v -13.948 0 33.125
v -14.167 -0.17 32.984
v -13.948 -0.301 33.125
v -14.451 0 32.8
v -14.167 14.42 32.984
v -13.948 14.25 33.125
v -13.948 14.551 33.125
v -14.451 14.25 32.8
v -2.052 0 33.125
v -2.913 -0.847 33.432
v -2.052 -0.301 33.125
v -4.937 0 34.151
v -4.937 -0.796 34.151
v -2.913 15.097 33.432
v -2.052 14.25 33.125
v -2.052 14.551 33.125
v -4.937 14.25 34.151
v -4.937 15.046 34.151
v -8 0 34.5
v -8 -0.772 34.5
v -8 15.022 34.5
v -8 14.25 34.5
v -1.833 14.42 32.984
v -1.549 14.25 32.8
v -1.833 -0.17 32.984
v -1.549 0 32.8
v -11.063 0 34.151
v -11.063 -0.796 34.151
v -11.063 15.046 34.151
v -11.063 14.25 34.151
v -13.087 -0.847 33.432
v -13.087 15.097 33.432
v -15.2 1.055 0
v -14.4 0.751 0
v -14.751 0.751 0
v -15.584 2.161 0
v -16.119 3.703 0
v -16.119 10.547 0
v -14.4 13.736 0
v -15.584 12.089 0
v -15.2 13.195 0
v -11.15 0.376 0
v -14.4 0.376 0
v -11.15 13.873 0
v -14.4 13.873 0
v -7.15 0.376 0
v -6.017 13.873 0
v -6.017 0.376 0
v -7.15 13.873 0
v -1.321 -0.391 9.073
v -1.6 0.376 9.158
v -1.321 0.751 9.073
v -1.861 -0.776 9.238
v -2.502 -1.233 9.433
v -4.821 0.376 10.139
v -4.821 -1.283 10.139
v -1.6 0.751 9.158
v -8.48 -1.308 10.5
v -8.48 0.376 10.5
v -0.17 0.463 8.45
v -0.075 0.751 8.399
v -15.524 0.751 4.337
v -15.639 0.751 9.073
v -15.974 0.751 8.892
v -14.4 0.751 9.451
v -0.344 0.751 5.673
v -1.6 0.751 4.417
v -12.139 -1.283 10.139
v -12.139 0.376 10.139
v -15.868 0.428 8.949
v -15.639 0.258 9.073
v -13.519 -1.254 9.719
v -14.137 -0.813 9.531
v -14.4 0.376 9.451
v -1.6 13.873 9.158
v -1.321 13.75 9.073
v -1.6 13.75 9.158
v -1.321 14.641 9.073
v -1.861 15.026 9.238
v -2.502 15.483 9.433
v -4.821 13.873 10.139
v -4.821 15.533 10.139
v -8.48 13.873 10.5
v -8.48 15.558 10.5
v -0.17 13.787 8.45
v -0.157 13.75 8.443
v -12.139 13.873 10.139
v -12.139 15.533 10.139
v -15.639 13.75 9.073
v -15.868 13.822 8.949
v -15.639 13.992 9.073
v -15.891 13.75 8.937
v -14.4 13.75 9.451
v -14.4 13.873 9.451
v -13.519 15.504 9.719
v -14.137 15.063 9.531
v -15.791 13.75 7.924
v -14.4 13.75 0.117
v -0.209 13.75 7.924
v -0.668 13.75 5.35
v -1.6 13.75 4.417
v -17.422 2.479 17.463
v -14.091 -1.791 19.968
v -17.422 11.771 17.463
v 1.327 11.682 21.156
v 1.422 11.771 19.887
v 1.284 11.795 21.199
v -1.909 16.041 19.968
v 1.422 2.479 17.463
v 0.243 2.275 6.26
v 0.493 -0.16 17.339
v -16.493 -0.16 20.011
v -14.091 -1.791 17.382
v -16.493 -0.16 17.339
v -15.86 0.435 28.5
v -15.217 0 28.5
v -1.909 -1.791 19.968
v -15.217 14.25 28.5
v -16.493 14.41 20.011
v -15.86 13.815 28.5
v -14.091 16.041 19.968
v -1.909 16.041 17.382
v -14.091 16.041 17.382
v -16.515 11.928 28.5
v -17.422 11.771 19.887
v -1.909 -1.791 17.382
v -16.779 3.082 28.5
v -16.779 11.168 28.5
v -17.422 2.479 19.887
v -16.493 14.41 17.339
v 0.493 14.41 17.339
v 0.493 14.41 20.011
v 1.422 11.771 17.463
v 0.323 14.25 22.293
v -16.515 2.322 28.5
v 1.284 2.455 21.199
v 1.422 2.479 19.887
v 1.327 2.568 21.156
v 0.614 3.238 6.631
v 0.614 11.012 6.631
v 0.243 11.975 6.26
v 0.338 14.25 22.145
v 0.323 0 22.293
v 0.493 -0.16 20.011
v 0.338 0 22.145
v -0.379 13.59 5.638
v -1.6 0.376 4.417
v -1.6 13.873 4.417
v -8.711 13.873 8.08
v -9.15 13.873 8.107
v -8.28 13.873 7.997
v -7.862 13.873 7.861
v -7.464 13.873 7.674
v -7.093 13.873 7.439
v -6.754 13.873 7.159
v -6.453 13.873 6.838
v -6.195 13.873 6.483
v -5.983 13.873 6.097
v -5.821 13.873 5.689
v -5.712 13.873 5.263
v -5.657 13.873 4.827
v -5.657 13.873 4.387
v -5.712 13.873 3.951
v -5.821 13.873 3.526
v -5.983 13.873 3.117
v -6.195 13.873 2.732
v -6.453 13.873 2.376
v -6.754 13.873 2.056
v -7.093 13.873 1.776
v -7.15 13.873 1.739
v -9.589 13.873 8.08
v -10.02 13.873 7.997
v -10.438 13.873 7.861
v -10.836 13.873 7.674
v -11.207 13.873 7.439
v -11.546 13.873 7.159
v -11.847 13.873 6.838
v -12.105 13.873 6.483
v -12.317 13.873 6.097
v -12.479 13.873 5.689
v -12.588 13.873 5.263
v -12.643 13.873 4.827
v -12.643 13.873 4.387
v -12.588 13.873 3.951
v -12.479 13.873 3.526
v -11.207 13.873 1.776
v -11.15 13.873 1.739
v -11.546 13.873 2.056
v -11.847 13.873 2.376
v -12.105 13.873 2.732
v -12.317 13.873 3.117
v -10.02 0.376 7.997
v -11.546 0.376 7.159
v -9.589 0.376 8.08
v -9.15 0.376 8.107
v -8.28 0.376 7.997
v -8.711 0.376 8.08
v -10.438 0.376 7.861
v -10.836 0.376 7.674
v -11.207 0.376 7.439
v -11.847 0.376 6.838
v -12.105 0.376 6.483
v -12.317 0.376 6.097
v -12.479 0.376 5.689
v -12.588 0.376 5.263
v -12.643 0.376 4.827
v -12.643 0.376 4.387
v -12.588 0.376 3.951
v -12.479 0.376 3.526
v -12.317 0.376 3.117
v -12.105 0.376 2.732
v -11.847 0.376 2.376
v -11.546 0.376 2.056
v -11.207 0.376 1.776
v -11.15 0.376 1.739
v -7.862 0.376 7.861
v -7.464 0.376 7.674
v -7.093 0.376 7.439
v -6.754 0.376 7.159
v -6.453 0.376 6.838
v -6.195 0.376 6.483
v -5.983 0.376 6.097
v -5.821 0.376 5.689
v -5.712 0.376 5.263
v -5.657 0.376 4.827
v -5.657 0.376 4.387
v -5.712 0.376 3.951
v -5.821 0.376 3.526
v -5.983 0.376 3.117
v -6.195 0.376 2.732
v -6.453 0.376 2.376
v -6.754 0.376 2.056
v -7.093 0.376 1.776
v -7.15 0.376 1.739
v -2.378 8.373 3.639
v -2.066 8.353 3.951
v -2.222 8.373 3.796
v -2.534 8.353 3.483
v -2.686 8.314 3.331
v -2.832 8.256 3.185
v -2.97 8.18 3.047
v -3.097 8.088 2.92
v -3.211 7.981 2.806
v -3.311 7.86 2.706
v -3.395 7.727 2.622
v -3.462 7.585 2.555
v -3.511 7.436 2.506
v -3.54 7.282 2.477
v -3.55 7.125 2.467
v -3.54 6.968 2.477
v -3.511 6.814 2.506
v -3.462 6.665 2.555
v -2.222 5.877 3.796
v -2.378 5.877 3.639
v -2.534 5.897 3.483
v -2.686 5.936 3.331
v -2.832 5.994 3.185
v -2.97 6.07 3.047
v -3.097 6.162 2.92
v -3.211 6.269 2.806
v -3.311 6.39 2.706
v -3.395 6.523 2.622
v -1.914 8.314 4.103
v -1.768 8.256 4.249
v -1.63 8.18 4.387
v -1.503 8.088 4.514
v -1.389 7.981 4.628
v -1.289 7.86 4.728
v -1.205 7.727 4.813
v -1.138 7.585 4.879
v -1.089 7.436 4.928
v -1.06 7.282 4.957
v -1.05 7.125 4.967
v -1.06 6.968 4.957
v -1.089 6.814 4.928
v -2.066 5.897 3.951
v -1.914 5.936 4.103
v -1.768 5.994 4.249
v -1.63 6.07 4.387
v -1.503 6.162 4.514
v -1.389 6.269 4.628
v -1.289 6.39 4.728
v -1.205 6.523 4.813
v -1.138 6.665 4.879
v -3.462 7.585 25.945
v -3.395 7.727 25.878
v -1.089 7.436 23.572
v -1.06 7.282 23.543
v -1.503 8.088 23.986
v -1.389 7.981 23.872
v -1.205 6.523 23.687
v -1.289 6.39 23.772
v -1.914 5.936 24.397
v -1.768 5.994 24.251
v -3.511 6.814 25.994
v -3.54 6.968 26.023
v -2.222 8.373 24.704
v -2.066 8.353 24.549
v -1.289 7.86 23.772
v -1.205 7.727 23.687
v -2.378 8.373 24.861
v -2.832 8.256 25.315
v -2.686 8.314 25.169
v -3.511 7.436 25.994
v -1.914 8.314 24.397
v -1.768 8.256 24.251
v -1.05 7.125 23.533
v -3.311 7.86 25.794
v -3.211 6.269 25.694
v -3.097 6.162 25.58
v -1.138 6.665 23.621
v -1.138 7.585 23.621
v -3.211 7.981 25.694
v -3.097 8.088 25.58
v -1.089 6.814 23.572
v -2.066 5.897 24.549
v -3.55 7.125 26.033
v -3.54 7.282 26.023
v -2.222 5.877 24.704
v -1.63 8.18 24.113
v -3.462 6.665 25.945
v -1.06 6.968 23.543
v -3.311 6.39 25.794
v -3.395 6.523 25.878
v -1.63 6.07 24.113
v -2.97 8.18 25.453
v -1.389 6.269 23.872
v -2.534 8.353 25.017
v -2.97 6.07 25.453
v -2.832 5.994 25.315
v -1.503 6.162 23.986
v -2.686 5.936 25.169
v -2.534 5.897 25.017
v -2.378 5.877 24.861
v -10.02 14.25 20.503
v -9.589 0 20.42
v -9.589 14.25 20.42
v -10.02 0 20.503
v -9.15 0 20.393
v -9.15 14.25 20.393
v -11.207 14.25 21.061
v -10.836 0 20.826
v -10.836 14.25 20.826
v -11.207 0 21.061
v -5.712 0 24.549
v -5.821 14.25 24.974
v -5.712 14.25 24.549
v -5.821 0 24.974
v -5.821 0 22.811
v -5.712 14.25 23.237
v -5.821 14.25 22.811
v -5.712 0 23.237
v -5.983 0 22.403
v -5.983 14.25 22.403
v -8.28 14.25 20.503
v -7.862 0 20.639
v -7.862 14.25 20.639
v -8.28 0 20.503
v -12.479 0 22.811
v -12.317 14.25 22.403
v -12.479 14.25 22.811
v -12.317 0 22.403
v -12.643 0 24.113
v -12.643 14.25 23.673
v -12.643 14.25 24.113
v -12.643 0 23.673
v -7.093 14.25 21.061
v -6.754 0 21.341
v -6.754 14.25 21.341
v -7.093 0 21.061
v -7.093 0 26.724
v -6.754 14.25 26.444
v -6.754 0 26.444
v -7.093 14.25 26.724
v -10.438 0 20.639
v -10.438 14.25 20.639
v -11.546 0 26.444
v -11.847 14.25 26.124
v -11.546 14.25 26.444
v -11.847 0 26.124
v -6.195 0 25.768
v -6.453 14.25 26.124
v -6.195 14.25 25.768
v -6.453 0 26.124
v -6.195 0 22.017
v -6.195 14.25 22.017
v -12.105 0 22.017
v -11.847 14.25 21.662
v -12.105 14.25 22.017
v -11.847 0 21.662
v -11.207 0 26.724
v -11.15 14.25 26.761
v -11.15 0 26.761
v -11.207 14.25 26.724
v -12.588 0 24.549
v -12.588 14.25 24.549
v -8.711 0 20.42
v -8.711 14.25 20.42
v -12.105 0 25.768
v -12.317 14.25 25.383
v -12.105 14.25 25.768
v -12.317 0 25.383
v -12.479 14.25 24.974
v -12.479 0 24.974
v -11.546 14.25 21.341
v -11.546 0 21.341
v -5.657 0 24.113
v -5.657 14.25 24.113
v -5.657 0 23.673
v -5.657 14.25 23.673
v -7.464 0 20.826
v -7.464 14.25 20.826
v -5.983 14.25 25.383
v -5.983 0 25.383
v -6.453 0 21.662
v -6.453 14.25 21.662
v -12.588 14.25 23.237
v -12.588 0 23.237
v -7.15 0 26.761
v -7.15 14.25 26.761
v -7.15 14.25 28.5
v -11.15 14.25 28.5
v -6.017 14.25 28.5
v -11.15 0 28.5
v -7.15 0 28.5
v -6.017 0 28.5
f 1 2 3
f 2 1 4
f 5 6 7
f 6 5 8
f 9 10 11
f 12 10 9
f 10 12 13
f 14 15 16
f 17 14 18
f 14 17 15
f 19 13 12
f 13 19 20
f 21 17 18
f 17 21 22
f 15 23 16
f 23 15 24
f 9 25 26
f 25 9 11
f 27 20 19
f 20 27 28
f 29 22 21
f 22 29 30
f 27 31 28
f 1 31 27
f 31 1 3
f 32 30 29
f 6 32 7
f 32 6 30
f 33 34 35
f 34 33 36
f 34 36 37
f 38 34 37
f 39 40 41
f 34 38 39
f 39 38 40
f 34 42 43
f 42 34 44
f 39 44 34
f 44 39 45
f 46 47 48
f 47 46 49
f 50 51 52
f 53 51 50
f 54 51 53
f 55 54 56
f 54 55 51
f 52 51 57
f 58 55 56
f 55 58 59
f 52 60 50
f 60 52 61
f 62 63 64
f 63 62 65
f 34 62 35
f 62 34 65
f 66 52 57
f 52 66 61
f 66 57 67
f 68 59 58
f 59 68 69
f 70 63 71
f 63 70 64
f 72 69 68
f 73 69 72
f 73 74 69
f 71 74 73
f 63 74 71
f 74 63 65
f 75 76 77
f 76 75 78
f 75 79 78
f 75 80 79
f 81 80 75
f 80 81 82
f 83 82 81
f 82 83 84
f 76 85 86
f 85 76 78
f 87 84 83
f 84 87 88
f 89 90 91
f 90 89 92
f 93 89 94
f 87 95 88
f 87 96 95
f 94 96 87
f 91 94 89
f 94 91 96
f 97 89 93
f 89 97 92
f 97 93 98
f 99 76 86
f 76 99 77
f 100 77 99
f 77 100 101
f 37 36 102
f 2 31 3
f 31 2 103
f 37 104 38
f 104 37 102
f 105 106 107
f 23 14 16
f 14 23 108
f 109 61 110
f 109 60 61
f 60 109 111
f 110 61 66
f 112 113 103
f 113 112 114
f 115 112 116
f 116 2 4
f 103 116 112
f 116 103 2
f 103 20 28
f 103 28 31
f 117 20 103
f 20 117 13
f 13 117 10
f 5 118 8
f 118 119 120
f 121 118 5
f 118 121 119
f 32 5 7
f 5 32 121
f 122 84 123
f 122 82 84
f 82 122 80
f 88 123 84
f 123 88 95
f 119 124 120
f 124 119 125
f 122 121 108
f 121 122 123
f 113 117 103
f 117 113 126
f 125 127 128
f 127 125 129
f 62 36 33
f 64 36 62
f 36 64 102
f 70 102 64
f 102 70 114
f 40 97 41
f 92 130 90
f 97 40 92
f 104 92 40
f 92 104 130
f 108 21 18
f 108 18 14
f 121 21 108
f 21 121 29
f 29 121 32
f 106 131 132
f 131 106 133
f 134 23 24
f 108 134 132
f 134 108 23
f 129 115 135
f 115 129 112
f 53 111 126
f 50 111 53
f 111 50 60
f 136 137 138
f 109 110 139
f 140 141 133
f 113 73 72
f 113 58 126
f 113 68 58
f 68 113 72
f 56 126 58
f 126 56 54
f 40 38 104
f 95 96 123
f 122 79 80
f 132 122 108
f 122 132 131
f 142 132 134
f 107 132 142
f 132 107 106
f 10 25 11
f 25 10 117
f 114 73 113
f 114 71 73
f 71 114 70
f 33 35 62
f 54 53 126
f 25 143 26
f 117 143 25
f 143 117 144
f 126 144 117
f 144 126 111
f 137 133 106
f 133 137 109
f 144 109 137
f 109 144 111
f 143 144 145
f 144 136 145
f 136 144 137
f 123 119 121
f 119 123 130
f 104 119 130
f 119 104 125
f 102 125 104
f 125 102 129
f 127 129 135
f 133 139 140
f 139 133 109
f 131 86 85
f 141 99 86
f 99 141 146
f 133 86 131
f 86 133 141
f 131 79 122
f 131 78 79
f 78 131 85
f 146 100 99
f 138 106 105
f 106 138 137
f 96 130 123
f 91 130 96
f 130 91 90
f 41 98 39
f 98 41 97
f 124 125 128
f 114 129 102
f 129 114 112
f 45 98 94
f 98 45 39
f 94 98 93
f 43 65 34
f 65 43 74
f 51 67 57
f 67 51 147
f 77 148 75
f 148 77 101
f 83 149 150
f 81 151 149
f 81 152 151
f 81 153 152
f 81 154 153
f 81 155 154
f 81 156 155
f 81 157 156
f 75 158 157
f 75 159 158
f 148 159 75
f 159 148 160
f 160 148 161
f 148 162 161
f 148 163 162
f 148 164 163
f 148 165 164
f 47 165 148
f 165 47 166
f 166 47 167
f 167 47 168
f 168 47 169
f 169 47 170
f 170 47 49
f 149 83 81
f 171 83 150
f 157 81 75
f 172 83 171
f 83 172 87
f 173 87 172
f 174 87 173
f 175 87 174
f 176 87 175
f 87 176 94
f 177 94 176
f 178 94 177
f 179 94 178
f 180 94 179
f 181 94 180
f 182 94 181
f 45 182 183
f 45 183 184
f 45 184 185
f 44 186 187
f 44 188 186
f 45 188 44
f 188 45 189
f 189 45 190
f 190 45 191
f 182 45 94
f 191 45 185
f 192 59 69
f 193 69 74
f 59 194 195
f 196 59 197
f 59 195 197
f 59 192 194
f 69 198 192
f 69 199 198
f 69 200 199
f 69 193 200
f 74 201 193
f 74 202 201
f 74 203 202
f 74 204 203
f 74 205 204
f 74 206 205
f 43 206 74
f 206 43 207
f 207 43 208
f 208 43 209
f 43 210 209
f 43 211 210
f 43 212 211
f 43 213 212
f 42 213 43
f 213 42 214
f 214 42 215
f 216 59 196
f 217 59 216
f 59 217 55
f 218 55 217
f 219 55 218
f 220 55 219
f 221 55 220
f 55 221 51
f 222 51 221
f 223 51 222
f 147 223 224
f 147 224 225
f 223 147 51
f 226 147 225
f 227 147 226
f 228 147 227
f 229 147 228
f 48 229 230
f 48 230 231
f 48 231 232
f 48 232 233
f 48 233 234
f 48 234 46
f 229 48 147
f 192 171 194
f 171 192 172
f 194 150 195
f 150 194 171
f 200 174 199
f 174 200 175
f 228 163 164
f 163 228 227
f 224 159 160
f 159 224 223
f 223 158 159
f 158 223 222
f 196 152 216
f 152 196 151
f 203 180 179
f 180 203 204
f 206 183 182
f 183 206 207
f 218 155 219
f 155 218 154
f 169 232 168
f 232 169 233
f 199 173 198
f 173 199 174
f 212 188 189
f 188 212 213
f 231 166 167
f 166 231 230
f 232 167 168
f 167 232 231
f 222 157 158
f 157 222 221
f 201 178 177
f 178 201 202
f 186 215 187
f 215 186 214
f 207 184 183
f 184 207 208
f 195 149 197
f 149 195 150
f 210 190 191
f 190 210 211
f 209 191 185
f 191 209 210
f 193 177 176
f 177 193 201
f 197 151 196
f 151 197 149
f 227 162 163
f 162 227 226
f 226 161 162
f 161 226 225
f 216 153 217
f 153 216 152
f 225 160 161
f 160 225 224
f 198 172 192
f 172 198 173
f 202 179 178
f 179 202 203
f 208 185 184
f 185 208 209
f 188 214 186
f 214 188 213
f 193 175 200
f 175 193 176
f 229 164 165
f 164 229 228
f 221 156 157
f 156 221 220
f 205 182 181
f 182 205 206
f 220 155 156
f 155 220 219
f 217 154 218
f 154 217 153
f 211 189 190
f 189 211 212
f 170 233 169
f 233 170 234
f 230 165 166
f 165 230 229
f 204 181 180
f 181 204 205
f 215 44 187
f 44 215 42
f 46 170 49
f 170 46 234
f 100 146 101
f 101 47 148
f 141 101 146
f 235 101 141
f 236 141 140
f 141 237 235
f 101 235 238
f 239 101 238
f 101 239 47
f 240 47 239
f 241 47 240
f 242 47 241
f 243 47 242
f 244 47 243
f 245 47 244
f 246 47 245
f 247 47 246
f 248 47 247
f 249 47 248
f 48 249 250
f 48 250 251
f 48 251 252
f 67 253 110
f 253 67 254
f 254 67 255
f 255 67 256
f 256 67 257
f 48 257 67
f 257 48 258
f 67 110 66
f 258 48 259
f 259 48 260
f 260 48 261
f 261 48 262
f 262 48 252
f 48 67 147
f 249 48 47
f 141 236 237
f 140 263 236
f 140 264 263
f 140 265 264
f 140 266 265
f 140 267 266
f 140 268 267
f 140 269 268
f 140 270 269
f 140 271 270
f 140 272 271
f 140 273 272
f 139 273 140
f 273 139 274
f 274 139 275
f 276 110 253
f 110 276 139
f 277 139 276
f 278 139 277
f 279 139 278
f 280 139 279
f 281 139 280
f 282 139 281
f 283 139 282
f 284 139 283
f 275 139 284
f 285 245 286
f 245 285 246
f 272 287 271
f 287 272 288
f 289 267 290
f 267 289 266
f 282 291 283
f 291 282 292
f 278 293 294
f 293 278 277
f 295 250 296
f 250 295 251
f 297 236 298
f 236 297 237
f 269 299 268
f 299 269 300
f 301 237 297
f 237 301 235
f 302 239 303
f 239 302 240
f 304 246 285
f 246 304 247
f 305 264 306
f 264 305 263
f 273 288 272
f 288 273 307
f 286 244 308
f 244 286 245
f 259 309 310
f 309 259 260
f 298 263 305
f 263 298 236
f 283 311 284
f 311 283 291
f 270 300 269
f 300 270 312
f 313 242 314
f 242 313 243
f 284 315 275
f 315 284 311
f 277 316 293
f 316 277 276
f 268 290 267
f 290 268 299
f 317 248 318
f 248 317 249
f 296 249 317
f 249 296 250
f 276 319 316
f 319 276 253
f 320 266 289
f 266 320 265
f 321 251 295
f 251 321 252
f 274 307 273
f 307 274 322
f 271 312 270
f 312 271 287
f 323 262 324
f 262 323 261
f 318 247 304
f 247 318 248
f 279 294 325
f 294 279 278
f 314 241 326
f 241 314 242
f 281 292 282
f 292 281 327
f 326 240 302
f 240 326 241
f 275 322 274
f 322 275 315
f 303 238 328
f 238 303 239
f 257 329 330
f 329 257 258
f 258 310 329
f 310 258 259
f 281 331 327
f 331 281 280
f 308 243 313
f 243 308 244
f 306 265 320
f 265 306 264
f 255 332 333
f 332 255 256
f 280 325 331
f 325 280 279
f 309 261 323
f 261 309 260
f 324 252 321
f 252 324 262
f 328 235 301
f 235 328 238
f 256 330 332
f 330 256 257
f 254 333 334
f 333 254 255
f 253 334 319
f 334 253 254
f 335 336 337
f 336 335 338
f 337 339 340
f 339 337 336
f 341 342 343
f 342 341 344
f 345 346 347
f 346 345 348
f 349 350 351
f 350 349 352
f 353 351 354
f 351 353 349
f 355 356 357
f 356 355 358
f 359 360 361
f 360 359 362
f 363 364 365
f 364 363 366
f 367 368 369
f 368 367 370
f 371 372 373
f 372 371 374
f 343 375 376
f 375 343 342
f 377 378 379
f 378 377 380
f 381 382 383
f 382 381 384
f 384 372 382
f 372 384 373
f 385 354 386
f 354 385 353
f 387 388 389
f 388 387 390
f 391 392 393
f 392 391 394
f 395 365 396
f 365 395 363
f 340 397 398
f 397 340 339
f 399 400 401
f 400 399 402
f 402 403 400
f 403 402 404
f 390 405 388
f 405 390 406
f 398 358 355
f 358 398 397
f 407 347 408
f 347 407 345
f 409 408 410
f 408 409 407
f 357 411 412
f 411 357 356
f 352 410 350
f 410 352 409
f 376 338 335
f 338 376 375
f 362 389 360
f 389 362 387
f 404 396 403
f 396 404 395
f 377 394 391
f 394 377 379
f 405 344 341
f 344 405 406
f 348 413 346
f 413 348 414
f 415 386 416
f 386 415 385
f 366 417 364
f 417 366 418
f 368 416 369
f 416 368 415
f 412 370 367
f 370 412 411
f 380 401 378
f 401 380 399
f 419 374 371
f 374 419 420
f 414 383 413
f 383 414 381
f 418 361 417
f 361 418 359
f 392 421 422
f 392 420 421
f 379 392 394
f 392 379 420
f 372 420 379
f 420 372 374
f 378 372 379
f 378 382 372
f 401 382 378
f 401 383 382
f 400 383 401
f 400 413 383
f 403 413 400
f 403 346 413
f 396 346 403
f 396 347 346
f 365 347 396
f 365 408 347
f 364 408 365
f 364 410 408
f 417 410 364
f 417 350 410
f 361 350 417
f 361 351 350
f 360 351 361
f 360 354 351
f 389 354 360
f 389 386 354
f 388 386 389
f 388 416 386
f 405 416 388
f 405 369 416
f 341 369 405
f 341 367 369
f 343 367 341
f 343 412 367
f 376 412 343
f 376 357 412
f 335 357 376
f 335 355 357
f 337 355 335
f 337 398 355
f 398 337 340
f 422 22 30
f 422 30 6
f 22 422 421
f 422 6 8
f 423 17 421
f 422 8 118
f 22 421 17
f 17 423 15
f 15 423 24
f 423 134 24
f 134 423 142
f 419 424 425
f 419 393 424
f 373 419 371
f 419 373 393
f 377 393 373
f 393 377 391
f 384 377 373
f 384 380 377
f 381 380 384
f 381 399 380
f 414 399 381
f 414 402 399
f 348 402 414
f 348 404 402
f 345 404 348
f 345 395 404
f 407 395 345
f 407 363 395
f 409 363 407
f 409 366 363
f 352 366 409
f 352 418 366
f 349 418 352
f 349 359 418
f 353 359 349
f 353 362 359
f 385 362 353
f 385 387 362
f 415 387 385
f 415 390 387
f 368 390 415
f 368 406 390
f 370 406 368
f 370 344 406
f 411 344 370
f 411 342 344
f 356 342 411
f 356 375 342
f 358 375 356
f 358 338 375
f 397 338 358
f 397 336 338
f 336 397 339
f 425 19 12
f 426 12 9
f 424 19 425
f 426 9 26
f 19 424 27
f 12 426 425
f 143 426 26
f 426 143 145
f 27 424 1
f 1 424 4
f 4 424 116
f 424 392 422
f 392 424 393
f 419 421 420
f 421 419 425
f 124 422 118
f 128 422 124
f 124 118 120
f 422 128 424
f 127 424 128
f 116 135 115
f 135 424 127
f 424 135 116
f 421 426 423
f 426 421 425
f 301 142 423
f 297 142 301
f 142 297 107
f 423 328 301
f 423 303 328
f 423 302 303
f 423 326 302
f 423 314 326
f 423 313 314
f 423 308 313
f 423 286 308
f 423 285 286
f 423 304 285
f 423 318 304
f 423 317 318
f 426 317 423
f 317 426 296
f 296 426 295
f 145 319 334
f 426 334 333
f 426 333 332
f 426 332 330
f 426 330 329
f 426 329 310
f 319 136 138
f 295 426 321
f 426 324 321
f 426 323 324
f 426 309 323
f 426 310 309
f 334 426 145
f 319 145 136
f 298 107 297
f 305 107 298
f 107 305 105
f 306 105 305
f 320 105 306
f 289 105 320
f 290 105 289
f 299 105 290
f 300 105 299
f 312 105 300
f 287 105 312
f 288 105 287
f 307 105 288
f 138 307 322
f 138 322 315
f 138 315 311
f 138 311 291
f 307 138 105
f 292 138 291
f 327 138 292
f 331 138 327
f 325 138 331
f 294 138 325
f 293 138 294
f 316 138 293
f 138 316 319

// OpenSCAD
// file: finger_base.scad
include <../config.scad>

rotate([0,-90,0]) fingerbase();

/**
 * Proximal phalanx for all digits (fingers and thumb) - rendered from parts/finger_base.scad
 * @id finger_base
 * @name Finger Base
 * @category Printed
 */

//	Base segment of finger, can be lengthened
module fingerbase(length=23, proximalHole=true, distalHole=true)
{
	difference() {
		scale([yScaleFactor,xScaleFactor,zScaleFactor]) {
			fingerbasesolid(length);
		}
		if(proximalHole) {
			translate([0,knucklePadding/2 * xScaleFactor,0]) fingerhardwarecutouts(jointDia, jointThick, knuckleW=knuckleW-knucklePadding, fingerLen=length);
		}
		if (distalHole) {
			translate([length * yScaleFactor,0,0]) mirror([1,0,0]) fingerhardwarecutouts(jointDia, jointThick, knuckleW=knuckleW, fingerLen=length);
		}
	}


	
}

module fingerhardwarecutouts(jointDia,jointThick,knuckleW,fingerLen,holeCutoff=100) {
	//slot for flex joint
	translate([7 - (15/jointDia),0,6*zScaleFactor - (1.8/jointThick)]) {
		rotate([90,0,0]) translate([-0.25,0,-knuckleW*xScaleFactor]) cylinder(d=jointDia, h=knuckleW*xScaleFactor, $fn=50);
		translate([-25,(knuckleW*xScaleFactor) / 2,0]) cube([50,knuckleW*xScaleFactor,jointThick], center=true);
	}
	//cubic parts
	translate([-100,0,0]) cube([100,knuckleW*xScaleFactor,100]);
	translate([-13/zScaleFactor,0,0]) rotate([0,45,0]) translate([-50,0,0]) cube([100,knuckleW * xScaleFactor, 10]);

	//channel for string/tendon
	translate([-fingerLen/2 * yScaleFactor, knuckleW/2 * xScaleFactor, 2.3]) rotate([0,90,0]) cylinder(d=2.5, h=holeCutoff, $fn=50);
}

//	base segment of finger, solid
module fingerbasesolid(length=50, cutout=true) {
	difference() {
		//cubic part
		translate([0,0.001 + knucklePadding/2,1]) cube([length, knuckleW - knucklePadding - 0.002, 8]);
	}
	
	//cylindrical-ish part around finger
	intersection() {
		//overly large shape to get the cross section in the XZ plane from
		difference() {
			union() {
				translate([length-4,-5,5]) rotate([-90,0,0]) cylinder(r=8,h=knuckleW + 10);
				translate([0,-5,-5]) cube([length,knuckleW + 10,20]);
			}
			//cutout for the side "guards" of the previous knuckle
			if(cutout) {
				translate([-4,-knuckleW+0.001,5.3]) rotate([-90,0,0]) cylinder(r=11,h=10);
				translate([-4,knuckleW - knucklePadding*(1/xScaleFactor),5.3]) rotate([-90,0,0]) cylinder(r=11,h=10);
			}
		}

		hull() {
			for(i=[-1,1], j=[-1,1]) {
				//angled cylinders to provide the outer shape of the finger
				translate([length/10,i*2.4 + knuckleW/2,j*2.2 + 5]) rotate([i*j*-4,j*86,0]) cylinder(d=6,h=20,center=true);
				translate([length+4, i*2.4 + knuckleW/2, j*2.2 + 5]) rotate([i*j*-4,j*-86,0]) cylinder(d=6,h=20,center=true);
			}
		}
	}
}
// file: ../config.scad
/**
 * Configuration settings for Flexy Beast, required to generate correctly sized STLs of the printed parts. See the Configuration File Assembly instructions to set this up.
 * @id config_file
 * @name Configuration File
 * @category Prerequisites!
 * @step Open config.scad in your favorite text editor.
 * @step As per the normal Cyborg Beast instructions, measure the width of the knuckles in the non-affected hand and convert to millimeters.
 * @step Add 5 to that result and then divide by 55.
 * @step Replace the x-, y-, and zScaleFactor variables in config.scad with that number.
 * @step If desired, adjust the proportions of the hand by changing those variables individually. xScaleFactor controls the width of the hand, yScaleFactor controls the length, and zScaleFactor controls the height.
 * @step Open assembly.scad in OpenSCAD to check that the flexy joint holes are not too large for the hand (should only be necessary for small children). If necessary, reduce the jointDia and jointThick variables. jointDia=5 and jointThick=2 is a good amount for smaller hands.
 * @step Set the fingerPads variable to true or false depending on whether you want to cast silicone finger pads for improved grip.
 * @step Open palm.scad, finger_base.scad, finger_tip.scad, and thumb_tip.scad in OpenSCAD, render each part (F6), and export as STL, then print. Suggested print settings are 0.2mm or smaller layer height, 3 perimeters, and 25% rectilinear or hexagonal infill.
 */

knuckleR = 4.85;
knucklePadding = 0.5;
knuckleW = 9.5;
wristH = 10;
palmH = 20;
palmW = 64;
th = 3;
fn = 32;

//flexy joint parameters
jointDia = 7;
jointThick = 4;

//finger pad settings
fingerPads = true; //whether or not to hollow the finger tips slightly for molding pads

//desired scale factor for hand based on the standard Cyborg Beast/Robohand sizing guide
xScaleFactor = 1.5; // [1.05:1.60]
yScaleFactor = 1.5; // [1.05:1.60]
zScaleFactor = 1.6; // [1.05:1.60]
// main file
include <../config.scad>
use <finger_base.scad>

rotate([0,-90,0]) fingermid();

//	Middle segment of finger, can be lengthened
module fingermid(length=19, proximalHole=true, distalHole=true)
{
	difference() {
		scale([yScaleFactor,xScaleFactor,zScaleFactor]) {
			fingerbasesolid(length);
		}
		if(proximalHole) {
			translate([0,knucklePadding/2 * xScaleFactor,0]) fingerhardwarecutouts(jointDia, jointThick, knuckleW=knuckleW-knucklePadding, fingerLen=length);
		}
		if(distalHole) {
			translate([length * yScaleFactor,0,0]) mirror([1,0,0]) fingerhardwarecutouts(jointDia, jointThick, knuckleW=knuckleW, fingerLen=length);
		}
	}
}
